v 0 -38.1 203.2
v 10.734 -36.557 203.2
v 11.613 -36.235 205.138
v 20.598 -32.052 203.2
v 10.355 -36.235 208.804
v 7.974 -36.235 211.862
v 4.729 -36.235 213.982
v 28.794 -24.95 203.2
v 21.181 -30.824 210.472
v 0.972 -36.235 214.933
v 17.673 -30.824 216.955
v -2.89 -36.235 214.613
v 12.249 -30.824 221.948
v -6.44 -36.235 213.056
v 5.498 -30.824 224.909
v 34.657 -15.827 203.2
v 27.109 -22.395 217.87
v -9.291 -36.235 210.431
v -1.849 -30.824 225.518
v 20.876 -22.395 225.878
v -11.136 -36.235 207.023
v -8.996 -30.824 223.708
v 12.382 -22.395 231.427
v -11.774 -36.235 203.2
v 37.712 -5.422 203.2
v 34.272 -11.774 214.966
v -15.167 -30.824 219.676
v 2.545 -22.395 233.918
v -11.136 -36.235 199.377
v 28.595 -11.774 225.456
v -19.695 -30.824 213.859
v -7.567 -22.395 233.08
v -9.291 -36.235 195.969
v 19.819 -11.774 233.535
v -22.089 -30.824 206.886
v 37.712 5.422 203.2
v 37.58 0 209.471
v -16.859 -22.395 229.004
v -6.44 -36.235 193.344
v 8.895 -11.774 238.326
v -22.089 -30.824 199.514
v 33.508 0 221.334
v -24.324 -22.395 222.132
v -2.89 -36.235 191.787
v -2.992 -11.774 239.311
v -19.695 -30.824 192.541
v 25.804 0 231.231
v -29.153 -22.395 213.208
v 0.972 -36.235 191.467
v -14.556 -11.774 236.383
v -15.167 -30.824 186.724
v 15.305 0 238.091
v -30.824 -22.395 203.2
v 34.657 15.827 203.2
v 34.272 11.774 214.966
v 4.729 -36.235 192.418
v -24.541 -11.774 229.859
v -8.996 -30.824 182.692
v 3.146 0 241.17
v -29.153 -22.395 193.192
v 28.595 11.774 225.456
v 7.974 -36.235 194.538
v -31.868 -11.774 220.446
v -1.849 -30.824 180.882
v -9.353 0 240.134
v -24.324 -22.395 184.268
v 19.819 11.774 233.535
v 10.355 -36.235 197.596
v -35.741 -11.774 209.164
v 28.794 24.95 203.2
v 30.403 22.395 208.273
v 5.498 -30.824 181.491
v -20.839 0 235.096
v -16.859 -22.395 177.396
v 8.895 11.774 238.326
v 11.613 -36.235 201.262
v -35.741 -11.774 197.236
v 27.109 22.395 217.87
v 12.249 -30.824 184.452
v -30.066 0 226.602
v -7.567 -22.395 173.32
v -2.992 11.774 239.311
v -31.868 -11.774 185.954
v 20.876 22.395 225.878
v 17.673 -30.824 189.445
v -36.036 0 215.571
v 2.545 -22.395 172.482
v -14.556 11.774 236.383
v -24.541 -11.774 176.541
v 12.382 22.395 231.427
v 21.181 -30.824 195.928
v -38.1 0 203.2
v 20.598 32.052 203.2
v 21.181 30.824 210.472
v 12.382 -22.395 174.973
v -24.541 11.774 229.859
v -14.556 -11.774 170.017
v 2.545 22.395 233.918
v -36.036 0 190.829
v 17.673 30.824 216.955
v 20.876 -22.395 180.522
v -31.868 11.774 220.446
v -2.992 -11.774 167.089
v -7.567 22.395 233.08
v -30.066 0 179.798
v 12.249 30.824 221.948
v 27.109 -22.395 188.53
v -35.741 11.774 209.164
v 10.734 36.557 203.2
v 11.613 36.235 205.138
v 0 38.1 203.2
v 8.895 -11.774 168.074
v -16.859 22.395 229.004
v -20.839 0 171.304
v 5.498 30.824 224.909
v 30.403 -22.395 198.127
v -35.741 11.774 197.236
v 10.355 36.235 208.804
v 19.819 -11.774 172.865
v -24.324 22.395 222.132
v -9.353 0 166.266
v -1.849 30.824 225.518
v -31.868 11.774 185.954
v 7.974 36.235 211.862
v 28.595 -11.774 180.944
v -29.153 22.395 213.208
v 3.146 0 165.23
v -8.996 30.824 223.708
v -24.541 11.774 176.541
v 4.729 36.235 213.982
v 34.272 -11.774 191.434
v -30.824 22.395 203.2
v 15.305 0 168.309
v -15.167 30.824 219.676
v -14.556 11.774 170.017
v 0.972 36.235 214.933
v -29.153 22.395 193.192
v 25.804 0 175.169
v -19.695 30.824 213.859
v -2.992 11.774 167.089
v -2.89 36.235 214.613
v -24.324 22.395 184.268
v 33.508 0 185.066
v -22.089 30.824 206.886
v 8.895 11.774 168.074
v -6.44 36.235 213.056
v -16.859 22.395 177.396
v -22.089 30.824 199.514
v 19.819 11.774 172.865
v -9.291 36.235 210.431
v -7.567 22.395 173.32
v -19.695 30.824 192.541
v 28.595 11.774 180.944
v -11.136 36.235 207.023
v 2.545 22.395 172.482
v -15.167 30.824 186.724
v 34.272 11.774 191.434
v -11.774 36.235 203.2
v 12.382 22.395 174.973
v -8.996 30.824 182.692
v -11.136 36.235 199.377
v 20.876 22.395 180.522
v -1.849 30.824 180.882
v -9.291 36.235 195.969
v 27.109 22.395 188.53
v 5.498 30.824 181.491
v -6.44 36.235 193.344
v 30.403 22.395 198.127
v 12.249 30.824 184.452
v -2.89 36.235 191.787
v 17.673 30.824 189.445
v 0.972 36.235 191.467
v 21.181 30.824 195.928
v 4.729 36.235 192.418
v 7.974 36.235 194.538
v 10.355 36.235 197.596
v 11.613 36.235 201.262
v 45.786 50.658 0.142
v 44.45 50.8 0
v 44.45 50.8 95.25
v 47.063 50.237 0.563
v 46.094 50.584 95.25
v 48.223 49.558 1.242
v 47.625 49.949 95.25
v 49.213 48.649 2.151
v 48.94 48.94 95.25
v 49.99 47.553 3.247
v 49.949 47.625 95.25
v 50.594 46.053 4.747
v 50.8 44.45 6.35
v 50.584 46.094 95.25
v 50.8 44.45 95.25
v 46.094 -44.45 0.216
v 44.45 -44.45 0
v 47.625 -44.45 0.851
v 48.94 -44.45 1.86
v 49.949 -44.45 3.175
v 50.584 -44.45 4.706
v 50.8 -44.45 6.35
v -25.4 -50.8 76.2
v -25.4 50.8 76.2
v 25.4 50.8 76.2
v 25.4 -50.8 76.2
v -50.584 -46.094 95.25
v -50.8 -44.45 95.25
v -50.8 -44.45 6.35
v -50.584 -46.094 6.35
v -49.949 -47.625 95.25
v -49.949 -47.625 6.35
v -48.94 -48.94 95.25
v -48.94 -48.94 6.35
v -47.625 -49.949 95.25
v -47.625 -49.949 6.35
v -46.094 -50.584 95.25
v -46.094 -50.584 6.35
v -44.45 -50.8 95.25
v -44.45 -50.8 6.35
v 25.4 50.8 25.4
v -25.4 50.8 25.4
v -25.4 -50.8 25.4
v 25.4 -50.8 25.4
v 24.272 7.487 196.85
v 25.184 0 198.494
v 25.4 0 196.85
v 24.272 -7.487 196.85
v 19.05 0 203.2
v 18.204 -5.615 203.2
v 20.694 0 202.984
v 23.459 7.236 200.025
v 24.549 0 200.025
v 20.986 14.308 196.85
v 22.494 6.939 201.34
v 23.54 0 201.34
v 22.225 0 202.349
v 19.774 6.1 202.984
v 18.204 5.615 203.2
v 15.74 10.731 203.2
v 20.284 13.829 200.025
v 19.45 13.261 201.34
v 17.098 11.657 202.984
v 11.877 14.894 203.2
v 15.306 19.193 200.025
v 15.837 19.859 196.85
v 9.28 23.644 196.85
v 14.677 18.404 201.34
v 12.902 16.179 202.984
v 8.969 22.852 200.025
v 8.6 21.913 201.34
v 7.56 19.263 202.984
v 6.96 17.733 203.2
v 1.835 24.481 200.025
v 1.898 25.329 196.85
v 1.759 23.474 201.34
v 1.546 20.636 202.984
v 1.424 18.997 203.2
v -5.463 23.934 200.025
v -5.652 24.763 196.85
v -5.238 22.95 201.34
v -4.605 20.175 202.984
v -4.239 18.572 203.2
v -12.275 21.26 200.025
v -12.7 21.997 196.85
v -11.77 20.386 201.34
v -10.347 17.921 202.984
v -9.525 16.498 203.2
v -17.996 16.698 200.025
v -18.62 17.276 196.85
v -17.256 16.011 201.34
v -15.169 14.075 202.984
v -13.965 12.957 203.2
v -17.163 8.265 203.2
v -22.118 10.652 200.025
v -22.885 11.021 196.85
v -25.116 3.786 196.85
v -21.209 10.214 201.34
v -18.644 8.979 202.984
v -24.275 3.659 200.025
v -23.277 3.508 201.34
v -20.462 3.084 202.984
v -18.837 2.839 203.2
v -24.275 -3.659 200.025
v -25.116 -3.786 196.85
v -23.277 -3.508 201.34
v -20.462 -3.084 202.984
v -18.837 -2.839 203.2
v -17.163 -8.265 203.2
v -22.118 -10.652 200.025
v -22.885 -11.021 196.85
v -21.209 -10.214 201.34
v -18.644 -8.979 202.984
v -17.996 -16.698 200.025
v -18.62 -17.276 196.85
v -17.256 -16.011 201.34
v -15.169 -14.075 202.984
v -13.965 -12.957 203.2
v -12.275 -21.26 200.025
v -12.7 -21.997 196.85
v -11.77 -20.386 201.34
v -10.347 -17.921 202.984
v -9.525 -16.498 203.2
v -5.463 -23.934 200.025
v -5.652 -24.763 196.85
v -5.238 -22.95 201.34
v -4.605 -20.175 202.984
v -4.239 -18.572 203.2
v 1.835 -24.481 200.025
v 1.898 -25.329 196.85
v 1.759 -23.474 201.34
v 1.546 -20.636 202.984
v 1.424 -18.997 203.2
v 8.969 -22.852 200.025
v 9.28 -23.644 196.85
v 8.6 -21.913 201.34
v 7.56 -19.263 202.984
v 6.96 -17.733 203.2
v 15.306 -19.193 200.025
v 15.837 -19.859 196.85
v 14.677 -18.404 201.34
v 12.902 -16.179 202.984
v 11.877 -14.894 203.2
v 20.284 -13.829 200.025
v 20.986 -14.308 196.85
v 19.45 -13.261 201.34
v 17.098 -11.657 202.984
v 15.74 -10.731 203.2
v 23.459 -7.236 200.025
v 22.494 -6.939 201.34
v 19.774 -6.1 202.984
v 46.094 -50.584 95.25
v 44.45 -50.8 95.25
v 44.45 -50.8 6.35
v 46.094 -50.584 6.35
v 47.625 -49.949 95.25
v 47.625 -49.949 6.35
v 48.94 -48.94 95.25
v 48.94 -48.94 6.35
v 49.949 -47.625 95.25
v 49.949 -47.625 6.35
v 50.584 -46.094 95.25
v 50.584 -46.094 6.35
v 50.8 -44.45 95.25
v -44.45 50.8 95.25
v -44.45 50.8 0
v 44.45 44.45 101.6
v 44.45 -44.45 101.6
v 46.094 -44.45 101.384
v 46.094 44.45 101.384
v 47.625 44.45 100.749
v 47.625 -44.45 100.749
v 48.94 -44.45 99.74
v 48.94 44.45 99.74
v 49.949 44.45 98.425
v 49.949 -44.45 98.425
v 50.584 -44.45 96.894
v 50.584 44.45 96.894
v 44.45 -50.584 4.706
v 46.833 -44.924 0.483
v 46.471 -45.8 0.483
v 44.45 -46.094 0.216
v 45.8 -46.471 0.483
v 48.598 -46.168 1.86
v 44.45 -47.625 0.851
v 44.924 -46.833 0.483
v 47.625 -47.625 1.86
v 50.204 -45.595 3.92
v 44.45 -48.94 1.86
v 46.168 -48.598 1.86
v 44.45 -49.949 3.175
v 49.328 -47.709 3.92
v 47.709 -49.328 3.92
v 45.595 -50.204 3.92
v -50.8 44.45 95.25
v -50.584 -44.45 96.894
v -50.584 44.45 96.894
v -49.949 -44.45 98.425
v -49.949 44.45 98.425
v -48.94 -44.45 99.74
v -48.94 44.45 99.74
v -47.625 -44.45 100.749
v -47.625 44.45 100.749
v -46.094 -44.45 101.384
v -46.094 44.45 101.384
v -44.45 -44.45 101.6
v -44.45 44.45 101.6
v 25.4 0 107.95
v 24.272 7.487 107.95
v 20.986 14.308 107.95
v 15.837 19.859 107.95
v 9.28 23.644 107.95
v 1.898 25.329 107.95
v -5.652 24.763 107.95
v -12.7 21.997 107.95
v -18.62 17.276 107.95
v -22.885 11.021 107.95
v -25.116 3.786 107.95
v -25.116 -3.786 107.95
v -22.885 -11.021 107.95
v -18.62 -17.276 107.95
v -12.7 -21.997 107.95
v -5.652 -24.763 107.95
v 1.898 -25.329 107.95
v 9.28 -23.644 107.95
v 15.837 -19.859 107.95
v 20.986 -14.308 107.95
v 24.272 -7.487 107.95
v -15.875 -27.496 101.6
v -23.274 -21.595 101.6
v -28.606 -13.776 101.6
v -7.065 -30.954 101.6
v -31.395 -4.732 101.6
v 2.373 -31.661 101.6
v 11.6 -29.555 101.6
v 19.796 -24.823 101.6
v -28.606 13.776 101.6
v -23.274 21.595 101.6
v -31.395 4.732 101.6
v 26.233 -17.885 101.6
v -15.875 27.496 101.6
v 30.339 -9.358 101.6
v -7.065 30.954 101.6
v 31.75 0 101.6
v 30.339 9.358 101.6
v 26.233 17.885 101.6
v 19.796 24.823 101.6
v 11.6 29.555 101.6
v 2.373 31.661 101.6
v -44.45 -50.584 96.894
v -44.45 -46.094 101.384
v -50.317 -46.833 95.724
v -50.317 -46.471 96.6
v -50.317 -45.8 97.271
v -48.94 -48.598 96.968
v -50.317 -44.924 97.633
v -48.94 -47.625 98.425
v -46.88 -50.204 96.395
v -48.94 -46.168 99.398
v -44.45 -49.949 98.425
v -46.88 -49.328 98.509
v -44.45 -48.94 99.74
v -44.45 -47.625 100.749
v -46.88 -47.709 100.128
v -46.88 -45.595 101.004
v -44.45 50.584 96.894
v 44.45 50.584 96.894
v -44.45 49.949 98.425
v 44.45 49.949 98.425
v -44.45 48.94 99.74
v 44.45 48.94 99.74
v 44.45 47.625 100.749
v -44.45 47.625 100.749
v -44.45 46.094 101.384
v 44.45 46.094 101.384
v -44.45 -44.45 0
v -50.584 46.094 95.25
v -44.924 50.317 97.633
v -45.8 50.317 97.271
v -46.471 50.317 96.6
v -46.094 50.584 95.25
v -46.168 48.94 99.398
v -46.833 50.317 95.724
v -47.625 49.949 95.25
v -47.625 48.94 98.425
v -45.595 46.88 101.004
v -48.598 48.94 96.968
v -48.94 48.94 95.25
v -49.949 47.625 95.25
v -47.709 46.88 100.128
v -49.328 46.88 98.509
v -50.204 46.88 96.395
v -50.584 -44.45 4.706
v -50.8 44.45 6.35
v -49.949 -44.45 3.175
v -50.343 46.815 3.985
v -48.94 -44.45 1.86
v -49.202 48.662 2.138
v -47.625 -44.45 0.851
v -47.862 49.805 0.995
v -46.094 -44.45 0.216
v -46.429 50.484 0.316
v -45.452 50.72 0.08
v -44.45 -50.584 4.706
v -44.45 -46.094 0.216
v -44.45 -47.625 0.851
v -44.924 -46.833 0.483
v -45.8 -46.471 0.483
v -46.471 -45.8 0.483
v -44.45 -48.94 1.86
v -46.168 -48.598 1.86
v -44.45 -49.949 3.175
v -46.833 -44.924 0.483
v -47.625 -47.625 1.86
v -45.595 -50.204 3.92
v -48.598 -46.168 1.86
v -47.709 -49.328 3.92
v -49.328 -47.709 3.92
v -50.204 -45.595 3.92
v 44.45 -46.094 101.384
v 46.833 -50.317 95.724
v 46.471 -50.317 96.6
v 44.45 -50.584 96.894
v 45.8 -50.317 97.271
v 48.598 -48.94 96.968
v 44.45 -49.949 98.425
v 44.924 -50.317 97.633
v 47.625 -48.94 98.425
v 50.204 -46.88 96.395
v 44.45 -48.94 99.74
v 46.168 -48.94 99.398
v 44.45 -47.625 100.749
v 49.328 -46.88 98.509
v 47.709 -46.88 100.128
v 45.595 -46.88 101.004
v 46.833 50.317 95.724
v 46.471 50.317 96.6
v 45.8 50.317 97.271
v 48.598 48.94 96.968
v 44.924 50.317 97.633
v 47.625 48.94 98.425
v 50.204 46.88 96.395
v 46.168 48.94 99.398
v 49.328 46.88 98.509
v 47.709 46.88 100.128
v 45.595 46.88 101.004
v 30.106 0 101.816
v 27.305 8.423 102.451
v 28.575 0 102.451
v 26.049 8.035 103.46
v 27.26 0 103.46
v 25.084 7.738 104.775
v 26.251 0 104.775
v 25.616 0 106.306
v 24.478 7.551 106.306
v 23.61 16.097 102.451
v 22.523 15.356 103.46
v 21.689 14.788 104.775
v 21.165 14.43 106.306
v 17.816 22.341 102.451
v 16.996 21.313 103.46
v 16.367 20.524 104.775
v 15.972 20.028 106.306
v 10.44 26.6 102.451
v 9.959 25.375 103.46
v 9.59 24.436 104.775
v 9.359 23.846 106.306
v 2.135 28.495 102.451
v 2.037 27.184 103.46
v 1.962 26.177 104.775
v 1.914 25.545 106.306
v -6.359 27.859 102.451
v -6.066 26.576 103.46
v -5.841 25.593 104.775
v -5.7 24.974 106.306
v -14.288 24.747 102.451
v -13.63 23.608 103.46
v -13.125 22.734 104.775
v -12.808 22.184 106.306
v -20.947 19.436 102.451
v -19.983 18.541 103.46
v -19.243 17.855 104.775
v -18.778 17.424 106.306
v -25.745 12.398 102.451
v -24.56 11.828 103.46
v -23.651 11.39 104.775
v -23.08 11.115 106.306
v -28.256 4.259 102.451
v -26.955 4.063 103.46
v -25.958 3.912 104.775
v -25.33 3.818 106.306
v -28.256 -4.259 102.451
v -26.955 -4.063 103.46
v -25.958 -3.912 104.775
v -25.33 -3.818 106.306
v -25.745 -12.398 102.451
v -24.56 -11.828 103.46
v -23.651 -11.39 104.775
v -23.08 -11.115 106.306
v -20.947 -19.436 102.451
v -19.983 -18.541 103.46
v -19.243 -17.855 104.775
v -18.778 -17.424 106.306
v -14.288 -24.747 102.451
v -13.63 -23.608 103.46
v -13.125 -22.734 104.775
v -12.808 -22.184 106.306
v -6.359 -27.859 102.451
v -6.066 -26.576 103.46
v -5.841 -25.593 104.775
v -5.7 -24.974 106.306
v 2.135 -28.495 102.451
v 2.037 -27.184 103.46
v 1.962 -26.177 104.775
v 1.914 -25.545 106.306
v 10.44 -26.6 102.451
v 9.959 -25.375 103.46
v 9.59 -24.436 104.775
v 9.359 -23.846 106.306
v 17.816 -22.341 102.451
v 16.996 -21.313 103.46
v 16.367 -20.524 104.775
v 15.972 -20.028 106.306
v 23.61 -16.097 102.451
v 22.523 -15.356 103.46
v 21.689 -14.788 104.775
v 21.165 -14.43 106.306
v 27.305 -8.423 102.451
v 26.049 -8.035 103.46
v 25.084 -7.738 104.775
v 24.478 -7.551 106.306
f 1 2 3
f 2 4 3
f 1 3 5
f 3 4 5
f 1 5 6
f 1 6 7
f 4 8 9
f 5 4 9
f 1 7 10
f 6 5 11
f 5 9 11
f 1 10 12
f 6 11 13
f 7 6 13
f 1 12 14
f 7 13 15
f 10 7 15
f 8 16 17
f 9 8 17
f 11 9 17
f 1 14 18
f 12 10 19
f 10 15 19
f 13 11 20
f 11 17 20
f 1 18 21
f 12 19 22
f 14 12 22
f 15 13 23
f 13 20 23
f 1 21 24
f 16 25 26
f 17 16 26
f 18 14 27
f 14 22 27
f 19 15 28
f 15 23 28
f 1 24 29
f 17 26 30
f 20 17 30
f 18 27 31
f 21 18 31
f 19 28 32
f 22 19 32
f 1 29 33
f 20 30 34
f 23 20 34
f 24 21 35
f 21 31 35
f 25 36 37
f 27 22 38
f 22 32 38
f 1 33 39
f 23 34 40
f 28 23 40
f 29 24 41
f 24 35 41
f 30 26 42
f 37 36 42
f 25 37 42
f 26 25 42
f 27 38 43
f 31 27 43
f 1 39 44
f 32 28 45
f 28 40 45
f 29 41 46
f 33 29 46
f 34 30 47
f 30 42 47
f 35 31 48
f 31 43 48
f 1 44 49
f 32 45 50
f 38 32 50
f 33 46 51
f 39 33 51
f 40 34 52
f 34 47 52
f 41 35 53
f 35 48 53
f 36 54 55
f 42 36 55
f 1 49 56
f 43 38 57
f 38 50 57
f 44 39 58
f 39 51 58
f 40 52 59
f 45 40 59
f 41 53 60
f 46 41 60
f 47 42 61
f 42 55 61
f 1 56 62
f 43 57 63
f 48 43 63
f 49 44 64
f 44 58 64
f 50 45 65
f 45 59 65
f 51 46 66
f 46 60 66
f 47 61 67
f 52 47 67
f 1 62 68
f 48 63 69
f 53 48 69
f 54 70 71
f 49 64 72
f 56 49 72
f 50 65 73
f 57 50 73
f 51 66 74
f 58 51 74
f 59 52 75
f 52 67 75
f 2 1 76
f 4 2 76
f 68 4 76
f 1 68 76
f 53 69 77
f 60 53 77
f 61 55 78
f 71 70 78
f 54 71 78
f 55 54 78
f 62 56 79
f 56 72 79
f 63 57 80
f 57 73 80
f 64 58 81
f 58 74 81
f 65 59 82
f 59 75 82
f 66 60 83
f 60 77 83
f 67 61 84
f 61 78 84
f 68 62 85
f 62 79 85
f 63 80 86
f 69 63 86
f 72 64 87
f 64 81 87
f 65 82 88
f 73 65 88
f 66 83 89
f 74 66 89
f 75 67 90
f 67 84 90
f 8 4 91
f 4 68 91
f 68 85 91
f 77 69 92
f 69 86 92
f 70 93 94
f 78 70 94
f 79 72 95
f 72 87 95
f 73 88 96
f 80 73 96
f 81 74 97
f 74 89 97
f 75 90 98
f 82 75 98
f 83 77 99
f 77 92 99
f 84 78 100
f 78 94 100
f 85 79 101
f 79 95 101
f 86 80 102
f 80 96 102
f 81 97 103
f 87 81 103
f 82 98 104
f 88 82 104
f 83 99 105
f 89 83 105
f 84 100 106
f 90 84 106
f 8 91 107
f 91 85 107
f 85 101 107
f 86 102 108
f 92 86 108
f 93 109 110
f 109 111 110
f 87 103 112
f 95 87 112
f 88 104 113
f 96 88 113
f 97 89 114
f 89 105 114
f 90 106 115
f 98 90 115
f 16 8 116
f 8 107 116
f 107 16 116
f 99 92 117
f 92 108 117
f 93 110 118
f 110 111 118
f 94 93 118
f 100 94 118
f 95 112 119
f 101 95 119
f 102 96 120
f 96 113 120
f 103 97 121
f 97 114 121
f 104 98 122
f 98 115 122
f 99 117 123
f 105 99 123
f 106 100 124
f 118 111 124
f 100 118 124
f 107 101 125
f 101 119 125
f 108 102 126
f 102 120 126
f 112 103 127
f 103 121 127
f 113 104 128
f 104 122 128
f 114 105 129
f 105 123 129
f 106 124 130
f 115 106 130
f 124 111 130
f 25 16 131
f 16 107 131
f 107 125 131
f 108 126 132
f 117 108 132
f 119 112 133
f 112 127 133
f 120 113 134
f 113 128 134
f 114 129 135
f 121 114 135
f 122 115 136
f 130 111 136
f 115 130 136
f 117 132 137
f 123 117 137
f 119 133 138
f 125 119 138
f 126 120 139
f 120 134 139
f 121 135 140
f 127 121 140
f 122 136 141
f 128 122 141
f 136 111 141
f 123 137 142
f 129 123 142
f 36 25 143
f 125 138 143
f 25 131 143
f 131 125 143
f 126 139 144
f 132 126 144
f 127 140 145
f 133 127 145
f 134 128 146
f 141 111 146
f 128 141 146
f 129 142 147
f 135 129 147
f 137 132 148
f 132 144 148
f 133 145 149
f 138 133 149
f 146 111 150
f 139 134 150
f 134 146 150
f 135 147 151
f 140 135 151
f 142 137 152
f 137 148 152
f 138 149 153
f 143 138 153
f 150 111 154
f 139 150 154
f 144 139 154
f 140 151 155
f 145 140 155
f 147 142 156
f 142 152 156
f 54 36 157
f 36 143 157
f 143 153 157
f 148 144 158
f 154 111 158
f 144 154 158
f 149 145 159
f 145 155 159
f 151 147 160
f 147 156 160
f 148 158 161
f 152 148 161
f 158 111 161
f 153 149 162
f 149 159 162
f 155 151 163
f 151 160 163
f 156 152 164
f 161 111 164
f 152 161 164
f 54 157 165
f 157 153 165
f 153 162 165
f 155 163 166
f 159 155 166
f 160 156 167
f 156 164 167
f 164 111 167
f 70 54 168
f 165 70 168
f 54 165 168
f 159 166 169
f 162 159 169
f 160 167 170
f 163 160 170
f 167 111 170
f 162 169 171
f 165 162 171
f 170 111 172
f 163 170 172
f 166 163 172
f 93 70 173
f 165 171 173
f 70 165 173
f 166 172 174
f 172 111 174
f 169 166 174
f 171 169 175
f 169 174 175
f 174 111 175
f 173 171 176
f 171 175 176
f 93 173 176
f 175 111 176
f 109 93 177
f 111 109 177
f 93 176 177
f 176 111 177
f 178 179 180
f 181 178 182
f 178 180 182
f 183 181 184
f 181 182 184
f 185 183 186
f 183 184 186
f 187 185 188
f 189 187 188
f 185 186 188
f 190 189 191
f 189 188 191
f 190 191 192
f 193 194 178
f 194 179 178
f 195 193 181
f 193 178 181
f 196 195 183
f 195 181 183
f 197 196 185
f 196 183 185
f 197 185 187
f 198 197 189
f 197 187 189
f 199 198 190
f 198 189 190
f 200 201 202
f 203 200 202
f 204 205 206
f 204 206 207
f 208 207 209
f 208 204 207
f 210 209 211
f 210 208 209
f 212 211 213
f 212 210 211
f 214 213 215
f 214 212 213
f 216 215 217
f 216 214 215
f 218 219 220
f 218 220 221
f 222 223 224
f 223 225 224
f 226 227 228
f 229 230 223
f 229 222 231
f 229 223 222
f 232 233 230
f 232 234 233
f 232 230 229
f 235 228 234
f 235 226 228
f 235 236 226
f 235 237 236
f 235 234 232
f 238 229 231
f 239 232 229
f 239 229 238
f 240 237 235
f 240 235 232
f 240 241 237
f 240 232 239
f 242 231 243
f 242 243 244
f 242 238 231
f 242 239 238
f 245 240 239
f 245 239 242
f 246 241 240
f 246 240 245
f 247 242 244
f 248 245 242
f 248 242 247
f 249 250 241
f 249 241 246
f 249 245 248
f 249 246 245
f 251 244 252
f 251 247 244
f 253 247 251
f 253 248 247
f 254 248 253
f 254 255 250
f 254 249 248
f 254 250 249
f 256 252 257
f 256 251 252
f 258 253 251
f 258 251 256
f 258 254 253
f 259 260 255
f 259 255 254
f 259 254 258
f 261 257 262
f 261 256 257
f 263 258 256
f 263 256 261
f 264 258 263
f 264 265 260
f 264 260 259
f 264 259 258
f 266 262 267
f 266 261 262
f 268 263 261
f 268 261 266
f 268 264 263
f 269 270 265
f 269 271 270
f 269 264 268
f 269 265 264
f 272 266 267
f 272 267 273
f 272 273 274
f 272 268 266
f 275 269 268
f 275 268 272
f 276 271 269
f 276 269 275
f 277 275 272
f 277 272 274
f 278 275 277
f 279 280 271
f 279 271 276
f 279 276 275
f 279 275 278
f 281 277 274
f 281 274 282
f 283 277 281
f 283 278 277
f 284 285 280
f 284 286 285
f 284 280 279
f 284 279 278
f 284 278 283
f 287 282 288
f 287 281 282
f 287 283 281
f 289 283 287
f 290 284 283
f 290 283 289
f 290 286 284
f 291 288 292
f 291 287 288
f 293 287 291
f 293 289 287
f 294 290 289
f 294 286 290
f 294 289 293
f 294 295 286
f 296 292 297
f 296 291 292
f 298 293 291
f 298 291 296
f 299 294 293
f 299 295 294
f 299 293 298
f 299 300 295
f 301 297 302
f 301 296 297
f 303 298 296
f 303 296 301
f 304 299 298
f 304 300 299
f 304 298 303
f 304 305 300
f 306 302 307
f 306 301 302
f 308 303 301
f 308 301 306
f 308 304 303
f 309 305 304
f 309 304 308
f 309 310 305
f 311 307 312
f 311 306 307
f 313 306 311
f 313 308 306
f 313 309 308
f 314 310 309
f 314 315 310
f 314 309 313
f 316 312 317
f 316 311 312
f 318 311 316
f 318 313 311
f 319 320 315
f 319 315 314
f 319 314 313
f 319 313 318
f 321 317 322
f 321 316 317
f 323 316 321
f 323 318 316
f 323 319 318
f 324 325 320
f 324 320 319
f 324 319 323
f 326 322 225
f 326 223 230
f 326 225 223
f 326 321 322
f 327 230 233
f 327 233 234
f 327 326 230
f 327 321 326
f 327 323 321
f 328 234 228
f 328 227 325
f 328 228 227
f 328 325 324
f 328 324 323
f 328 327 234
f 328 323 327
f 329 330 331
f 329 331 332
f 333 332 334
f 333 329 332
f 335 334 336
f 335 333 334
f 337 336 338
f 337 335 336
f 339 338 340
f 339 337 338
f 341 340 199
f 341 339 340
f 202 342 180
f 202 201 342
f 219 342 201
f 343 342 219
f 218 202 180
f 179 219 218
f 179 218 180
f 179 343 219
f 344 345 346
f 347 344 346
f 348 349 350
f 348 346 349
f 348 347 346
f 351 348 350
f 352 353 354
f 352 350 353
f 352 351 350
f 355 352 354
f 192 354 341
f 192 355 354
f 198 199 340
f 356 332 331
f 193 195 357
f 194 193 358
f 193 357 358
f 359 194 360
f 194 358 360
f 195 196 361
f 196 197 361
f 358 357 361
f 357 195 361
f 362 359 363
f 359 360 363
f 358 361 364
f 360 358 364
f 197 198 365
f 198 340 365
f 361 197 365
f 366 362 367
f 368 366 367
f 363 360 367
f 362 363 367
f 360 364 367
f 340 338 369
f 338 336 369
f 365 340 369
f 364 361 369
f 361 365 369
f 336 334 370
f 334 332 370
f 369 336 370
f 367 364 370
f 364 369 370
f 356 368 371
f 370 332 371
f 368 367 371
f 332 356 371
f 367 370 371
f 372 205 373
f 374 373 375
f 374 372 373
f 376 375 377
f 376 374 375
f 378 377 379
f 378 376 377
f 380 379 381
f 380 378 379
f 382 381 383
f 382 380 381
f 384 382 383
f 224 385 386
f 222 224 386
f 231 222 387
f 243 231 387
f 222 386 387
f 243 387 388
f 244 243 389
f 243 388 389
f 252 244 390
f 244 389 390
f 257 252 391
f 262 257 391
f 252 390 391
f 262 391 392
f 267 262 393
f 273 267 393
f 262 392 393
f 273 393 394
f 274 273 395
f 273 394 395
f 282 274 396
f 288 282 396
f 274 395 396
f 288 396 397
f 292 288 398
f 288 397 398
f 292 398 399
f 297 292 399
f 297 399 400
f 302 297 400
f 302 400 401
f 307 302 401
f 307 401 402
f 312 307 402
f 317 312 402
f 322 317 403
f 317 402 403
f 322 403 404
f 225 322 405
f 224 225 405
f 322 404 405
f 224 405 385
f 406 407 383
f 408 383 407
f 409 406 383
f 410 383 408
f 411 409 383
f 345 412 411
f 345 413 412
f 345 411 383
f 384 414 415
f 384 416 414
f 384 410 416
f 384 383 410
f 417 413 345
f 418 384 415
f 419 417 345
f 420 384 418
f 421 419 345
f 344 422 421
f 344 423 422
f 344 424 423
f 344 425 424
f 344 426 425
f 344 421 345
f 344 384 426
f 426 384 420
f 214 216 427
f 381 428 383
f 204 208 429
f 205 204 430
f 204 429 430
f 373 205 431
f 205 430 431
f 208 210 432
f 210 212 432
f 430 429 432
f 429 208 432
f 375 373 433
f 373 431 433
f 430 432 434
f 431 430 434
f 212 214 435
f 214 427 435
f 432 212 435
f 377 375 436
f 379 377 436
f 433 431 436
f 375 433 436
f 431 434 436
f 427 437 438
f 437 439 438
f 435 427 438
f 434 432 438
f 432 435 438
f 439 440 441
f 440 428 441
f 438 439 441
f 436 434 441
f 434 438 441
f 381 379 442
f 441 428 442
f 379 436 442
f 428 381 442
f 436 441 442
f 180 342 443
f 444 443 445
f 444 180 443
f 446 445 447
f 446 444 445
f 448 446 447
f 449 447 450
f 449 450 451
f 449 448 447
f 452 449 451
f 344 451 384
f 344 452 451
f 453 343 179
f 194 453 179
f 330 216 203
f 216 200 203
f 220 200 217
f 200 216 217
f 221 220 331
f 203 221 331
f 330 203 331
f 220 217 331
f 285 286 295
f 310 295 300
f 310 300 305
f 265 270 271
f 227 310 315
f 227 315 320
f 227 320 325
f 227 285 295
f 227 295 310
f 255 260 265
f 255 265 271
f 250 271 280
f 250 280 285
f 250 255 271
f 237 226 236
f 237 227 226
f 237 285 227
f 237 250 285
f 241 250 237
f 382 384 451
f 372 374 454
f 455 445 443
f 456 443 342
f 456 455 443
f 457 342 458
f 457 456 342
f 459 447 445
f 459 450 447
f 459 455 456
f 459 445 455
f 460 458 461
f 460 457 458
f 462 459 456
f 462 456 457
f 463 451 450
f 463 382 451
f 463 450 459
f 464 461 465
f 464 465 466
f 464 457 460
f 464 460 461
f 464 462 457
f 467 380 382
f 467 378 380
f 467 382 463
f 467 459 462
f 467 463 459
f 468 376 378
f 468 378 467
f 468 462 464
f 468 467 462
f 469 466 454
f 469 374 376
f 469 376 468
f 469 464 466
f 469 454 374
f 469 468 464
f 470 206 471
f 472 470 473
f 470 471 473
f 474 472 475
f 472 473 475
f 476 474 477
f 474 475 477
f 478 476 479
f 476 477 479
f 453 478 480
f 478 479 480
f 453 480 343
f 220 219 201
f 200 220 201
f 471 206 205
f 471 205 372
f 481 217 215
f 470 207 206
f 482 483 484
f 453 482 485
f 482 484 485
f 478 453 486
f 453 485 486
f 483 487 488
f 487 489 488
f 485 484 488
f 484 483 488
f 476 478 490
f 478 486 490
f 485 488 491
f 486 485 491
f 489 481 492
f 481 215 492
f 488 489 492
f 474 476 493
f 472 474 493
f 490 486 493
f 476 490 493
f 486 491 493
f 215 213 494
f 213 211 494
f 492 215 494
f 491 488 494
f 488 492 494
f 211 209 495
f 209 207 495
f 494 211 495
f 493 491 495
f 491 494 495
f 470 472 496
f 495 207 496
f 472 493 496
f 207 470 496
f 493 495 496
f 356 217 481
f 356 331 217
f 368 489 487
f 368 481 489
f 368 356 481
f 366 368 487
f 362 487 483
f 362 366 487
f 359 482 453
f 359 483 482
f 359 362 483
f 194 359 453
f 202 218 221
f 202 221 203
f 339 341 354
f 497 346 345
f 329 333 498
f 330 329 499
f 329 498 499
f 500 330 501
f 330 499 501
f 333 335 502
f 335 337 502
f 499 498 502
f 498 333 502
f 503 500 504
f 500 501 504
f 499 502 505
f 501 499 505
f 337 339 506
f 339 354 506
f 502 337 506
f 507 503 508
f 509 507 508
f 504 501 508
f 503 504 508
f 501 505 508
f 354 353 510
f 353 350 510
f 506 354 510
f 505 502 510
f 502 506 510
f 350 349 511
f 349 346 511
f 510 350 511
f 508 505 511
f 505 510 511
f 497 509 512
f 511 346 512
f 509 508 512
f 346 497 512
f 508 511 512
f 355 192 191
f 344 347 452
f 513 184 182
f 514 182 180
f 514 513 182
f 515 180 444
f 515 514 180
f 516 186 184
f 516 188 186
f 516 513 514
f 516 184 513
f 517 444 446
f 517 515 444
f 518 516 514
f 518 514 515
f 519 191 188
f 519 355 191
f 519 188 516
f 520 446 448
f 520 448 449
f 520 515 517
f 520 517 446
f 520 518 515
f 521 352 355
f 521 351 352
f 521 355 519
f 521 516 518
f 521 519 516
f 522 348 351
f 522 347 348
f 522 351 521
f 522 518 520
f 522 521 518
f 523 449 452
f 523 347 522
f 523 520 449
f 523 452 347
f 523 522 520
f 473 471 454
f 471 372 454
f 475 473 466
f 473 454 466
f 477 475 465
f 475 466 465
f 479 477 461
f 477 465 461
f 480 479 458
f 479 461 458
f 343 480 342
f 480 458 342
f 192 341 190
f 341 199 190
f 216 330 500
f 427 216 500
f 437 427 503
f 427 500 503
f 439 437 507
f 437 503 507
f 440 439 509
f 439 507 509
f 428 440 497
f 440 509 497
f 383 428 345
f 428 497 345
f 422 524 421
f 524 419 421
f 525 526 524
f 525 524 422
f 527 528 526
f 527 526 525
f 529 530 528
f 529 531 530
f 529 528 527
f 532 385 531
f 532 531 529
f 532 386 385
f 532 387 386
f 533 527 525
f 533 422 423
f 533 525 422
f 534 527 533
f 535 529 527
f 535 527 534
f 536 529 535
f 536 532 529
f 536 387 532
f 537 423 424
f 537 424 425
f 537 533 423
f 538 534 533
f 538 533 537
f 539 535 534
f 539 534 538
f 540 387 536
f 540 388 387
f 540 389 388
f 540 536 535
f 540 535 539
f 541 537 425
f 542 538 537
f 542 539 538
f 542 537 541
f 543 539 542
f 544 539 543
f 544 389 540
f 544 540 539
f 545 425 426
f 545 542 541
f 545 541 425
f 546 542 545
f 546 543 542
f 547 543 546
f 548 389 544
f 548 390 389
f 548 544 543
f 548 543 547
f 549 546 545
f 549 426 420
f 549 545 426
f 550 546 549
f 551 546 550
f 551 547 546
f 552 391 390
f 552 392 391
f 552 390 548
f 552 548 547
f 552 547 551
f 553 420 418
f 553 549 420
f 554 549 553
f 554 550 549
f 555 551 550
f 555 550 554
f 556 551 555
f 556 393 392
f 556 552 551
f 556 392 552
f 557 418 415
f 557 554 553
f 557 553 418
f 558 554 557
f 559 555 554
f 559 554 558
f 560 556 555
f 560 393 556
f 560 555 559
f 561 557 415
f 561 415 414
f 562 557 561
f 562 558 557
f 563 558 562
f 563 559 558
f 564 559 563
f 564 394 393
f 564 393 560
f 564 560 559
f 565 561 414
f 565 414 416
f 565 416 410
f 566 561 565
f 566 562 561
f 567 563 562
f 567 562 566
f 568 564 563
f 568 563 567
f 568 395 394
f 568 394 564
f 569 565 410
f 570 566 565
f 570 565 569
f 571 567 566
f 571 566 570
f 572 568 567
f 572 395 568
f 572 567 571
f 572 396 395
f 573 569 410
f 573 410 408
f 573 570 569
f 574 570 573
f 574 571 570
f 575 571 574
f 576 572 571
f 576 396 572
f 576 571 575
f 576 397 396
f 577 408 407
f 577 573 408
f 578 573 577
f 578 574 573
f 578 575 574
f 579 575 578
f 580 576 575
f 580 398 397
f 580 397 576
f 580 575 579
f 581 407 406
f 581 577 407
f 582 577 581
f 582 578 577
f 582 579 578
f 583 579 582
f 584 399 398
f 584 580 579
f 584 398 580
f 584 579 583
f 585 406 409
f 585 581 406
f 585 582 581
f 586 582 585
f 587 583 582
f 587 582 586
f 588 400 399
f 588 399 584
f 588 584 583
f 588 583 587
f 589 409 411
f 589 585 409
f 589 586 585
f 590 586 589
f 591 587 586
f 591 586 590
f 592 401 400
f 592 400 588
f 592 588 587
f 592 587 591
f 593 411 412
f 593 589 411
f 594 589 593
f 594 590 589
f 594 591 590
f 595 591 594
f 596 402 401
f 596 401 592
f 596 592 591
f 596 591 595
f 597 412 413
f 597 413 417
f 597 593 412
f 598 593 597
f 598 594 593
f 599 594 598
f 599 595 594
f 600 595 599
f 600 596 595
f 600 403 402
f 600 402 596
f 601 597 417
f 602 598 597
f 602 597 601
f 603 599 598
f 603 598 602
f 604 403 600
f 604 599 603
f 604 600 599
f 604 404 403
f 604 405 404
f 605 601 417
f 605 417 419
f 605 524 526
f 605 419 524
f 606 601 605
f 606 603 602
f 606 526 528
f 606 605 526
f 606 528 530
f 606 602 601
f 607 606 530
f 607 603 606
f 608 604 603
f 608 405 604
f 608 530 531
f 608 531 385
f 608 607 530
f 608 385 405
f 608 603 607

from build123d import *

# Parameters (mm, degrees)
F0_W     = 101.6
F0_H     = 101.6
F1_DEPTH = 101.6
F3_R     = 25.4
F4_DEPTH = 101.6
F7_W     = 50.8
F7_H     = 50.8
F8_DEPTH = 101.6
F9_R     = 6.35


with BuildPart() as f1:
    # F0 (on Top) → F1 (new body)
    with BuildSketch(Plane.XY):
        Rectangle(F0_W, F0_H)
    extrude(amount=F1_DEPTH)

    # F3 (on face) → F4 (join)
    with BuildSketch(Plane.XY.offset(101.6)):
        Circle(F3_R)
    extrude(amount=F4_DEPTH)

    # F7 (on face) → F8 (cut)
    with BuildSketch(Plane.XZ.offset(50.8)):
        with Locations((0, 50.8)):
            Rectangle(F7_W, F7_H)
    extrude(amount=-F8_DEPTH, mode=Mode.SUBTRACT)

    # F9
    f9_edges = [f1.edges().sort_by_distance(p)[0] for p in [
        (50.8, 0, 101.6),
        (50.8, -50.8, 50.8),
        (50.8, 50.8, 50.8),
        (50.8, 0, 0),
        (0, -50.8, 101.6),
        (-50.8, -50.8, 50.8),
        (0, -50.8, 0),
        (-50.8, 0, 101.6),
        (0, 50.8, 101.6),
        (-50.8, 0, 0),
        (-50.8, 50.8, 50.8),
        (-25.4, 0, 101.6),
        (25.4, 0, 152.4),
        (-25.4, 0, 203.2),
    ]]
    fillet(f9_edges, radius=F9_R)


with BuildPart() as f6:
    # F5 (on face) → F6 (revolve)
    with BuildSketch(Plane.XY.offset(203.2)):
        with BuildLine():
            Line((0, -25.4), (0, -38.1))
            ThreePointArc((0, -38.1), (38.1, 0), (0, 38.1))
            Line((0, 38.1), (0, 25.4))
            ThreePointArc((0, 25.4), (17.9605122421, 17.9605122421), (25.4, 0))
            ThreePointArc((25.4, 0), (17.9605122421, -17.9605122421), (0, -25.4))
        make_face()
        with BuildLine():
            Line((0, 25.4), (0, -25.4))
            ThreePointArc((0, -25.4), (17.9605122421, -17.9605122421), (25.4, 0))
            ThreePointArc((25.4, 0), (17.9605122421, 17.9605122421), (0, 25.4))
        make_face()
    revolve(axis=Axis((0, 0, 203.2), (0, -1, 0)))


solid = Compound([f1.part, f6.part])
